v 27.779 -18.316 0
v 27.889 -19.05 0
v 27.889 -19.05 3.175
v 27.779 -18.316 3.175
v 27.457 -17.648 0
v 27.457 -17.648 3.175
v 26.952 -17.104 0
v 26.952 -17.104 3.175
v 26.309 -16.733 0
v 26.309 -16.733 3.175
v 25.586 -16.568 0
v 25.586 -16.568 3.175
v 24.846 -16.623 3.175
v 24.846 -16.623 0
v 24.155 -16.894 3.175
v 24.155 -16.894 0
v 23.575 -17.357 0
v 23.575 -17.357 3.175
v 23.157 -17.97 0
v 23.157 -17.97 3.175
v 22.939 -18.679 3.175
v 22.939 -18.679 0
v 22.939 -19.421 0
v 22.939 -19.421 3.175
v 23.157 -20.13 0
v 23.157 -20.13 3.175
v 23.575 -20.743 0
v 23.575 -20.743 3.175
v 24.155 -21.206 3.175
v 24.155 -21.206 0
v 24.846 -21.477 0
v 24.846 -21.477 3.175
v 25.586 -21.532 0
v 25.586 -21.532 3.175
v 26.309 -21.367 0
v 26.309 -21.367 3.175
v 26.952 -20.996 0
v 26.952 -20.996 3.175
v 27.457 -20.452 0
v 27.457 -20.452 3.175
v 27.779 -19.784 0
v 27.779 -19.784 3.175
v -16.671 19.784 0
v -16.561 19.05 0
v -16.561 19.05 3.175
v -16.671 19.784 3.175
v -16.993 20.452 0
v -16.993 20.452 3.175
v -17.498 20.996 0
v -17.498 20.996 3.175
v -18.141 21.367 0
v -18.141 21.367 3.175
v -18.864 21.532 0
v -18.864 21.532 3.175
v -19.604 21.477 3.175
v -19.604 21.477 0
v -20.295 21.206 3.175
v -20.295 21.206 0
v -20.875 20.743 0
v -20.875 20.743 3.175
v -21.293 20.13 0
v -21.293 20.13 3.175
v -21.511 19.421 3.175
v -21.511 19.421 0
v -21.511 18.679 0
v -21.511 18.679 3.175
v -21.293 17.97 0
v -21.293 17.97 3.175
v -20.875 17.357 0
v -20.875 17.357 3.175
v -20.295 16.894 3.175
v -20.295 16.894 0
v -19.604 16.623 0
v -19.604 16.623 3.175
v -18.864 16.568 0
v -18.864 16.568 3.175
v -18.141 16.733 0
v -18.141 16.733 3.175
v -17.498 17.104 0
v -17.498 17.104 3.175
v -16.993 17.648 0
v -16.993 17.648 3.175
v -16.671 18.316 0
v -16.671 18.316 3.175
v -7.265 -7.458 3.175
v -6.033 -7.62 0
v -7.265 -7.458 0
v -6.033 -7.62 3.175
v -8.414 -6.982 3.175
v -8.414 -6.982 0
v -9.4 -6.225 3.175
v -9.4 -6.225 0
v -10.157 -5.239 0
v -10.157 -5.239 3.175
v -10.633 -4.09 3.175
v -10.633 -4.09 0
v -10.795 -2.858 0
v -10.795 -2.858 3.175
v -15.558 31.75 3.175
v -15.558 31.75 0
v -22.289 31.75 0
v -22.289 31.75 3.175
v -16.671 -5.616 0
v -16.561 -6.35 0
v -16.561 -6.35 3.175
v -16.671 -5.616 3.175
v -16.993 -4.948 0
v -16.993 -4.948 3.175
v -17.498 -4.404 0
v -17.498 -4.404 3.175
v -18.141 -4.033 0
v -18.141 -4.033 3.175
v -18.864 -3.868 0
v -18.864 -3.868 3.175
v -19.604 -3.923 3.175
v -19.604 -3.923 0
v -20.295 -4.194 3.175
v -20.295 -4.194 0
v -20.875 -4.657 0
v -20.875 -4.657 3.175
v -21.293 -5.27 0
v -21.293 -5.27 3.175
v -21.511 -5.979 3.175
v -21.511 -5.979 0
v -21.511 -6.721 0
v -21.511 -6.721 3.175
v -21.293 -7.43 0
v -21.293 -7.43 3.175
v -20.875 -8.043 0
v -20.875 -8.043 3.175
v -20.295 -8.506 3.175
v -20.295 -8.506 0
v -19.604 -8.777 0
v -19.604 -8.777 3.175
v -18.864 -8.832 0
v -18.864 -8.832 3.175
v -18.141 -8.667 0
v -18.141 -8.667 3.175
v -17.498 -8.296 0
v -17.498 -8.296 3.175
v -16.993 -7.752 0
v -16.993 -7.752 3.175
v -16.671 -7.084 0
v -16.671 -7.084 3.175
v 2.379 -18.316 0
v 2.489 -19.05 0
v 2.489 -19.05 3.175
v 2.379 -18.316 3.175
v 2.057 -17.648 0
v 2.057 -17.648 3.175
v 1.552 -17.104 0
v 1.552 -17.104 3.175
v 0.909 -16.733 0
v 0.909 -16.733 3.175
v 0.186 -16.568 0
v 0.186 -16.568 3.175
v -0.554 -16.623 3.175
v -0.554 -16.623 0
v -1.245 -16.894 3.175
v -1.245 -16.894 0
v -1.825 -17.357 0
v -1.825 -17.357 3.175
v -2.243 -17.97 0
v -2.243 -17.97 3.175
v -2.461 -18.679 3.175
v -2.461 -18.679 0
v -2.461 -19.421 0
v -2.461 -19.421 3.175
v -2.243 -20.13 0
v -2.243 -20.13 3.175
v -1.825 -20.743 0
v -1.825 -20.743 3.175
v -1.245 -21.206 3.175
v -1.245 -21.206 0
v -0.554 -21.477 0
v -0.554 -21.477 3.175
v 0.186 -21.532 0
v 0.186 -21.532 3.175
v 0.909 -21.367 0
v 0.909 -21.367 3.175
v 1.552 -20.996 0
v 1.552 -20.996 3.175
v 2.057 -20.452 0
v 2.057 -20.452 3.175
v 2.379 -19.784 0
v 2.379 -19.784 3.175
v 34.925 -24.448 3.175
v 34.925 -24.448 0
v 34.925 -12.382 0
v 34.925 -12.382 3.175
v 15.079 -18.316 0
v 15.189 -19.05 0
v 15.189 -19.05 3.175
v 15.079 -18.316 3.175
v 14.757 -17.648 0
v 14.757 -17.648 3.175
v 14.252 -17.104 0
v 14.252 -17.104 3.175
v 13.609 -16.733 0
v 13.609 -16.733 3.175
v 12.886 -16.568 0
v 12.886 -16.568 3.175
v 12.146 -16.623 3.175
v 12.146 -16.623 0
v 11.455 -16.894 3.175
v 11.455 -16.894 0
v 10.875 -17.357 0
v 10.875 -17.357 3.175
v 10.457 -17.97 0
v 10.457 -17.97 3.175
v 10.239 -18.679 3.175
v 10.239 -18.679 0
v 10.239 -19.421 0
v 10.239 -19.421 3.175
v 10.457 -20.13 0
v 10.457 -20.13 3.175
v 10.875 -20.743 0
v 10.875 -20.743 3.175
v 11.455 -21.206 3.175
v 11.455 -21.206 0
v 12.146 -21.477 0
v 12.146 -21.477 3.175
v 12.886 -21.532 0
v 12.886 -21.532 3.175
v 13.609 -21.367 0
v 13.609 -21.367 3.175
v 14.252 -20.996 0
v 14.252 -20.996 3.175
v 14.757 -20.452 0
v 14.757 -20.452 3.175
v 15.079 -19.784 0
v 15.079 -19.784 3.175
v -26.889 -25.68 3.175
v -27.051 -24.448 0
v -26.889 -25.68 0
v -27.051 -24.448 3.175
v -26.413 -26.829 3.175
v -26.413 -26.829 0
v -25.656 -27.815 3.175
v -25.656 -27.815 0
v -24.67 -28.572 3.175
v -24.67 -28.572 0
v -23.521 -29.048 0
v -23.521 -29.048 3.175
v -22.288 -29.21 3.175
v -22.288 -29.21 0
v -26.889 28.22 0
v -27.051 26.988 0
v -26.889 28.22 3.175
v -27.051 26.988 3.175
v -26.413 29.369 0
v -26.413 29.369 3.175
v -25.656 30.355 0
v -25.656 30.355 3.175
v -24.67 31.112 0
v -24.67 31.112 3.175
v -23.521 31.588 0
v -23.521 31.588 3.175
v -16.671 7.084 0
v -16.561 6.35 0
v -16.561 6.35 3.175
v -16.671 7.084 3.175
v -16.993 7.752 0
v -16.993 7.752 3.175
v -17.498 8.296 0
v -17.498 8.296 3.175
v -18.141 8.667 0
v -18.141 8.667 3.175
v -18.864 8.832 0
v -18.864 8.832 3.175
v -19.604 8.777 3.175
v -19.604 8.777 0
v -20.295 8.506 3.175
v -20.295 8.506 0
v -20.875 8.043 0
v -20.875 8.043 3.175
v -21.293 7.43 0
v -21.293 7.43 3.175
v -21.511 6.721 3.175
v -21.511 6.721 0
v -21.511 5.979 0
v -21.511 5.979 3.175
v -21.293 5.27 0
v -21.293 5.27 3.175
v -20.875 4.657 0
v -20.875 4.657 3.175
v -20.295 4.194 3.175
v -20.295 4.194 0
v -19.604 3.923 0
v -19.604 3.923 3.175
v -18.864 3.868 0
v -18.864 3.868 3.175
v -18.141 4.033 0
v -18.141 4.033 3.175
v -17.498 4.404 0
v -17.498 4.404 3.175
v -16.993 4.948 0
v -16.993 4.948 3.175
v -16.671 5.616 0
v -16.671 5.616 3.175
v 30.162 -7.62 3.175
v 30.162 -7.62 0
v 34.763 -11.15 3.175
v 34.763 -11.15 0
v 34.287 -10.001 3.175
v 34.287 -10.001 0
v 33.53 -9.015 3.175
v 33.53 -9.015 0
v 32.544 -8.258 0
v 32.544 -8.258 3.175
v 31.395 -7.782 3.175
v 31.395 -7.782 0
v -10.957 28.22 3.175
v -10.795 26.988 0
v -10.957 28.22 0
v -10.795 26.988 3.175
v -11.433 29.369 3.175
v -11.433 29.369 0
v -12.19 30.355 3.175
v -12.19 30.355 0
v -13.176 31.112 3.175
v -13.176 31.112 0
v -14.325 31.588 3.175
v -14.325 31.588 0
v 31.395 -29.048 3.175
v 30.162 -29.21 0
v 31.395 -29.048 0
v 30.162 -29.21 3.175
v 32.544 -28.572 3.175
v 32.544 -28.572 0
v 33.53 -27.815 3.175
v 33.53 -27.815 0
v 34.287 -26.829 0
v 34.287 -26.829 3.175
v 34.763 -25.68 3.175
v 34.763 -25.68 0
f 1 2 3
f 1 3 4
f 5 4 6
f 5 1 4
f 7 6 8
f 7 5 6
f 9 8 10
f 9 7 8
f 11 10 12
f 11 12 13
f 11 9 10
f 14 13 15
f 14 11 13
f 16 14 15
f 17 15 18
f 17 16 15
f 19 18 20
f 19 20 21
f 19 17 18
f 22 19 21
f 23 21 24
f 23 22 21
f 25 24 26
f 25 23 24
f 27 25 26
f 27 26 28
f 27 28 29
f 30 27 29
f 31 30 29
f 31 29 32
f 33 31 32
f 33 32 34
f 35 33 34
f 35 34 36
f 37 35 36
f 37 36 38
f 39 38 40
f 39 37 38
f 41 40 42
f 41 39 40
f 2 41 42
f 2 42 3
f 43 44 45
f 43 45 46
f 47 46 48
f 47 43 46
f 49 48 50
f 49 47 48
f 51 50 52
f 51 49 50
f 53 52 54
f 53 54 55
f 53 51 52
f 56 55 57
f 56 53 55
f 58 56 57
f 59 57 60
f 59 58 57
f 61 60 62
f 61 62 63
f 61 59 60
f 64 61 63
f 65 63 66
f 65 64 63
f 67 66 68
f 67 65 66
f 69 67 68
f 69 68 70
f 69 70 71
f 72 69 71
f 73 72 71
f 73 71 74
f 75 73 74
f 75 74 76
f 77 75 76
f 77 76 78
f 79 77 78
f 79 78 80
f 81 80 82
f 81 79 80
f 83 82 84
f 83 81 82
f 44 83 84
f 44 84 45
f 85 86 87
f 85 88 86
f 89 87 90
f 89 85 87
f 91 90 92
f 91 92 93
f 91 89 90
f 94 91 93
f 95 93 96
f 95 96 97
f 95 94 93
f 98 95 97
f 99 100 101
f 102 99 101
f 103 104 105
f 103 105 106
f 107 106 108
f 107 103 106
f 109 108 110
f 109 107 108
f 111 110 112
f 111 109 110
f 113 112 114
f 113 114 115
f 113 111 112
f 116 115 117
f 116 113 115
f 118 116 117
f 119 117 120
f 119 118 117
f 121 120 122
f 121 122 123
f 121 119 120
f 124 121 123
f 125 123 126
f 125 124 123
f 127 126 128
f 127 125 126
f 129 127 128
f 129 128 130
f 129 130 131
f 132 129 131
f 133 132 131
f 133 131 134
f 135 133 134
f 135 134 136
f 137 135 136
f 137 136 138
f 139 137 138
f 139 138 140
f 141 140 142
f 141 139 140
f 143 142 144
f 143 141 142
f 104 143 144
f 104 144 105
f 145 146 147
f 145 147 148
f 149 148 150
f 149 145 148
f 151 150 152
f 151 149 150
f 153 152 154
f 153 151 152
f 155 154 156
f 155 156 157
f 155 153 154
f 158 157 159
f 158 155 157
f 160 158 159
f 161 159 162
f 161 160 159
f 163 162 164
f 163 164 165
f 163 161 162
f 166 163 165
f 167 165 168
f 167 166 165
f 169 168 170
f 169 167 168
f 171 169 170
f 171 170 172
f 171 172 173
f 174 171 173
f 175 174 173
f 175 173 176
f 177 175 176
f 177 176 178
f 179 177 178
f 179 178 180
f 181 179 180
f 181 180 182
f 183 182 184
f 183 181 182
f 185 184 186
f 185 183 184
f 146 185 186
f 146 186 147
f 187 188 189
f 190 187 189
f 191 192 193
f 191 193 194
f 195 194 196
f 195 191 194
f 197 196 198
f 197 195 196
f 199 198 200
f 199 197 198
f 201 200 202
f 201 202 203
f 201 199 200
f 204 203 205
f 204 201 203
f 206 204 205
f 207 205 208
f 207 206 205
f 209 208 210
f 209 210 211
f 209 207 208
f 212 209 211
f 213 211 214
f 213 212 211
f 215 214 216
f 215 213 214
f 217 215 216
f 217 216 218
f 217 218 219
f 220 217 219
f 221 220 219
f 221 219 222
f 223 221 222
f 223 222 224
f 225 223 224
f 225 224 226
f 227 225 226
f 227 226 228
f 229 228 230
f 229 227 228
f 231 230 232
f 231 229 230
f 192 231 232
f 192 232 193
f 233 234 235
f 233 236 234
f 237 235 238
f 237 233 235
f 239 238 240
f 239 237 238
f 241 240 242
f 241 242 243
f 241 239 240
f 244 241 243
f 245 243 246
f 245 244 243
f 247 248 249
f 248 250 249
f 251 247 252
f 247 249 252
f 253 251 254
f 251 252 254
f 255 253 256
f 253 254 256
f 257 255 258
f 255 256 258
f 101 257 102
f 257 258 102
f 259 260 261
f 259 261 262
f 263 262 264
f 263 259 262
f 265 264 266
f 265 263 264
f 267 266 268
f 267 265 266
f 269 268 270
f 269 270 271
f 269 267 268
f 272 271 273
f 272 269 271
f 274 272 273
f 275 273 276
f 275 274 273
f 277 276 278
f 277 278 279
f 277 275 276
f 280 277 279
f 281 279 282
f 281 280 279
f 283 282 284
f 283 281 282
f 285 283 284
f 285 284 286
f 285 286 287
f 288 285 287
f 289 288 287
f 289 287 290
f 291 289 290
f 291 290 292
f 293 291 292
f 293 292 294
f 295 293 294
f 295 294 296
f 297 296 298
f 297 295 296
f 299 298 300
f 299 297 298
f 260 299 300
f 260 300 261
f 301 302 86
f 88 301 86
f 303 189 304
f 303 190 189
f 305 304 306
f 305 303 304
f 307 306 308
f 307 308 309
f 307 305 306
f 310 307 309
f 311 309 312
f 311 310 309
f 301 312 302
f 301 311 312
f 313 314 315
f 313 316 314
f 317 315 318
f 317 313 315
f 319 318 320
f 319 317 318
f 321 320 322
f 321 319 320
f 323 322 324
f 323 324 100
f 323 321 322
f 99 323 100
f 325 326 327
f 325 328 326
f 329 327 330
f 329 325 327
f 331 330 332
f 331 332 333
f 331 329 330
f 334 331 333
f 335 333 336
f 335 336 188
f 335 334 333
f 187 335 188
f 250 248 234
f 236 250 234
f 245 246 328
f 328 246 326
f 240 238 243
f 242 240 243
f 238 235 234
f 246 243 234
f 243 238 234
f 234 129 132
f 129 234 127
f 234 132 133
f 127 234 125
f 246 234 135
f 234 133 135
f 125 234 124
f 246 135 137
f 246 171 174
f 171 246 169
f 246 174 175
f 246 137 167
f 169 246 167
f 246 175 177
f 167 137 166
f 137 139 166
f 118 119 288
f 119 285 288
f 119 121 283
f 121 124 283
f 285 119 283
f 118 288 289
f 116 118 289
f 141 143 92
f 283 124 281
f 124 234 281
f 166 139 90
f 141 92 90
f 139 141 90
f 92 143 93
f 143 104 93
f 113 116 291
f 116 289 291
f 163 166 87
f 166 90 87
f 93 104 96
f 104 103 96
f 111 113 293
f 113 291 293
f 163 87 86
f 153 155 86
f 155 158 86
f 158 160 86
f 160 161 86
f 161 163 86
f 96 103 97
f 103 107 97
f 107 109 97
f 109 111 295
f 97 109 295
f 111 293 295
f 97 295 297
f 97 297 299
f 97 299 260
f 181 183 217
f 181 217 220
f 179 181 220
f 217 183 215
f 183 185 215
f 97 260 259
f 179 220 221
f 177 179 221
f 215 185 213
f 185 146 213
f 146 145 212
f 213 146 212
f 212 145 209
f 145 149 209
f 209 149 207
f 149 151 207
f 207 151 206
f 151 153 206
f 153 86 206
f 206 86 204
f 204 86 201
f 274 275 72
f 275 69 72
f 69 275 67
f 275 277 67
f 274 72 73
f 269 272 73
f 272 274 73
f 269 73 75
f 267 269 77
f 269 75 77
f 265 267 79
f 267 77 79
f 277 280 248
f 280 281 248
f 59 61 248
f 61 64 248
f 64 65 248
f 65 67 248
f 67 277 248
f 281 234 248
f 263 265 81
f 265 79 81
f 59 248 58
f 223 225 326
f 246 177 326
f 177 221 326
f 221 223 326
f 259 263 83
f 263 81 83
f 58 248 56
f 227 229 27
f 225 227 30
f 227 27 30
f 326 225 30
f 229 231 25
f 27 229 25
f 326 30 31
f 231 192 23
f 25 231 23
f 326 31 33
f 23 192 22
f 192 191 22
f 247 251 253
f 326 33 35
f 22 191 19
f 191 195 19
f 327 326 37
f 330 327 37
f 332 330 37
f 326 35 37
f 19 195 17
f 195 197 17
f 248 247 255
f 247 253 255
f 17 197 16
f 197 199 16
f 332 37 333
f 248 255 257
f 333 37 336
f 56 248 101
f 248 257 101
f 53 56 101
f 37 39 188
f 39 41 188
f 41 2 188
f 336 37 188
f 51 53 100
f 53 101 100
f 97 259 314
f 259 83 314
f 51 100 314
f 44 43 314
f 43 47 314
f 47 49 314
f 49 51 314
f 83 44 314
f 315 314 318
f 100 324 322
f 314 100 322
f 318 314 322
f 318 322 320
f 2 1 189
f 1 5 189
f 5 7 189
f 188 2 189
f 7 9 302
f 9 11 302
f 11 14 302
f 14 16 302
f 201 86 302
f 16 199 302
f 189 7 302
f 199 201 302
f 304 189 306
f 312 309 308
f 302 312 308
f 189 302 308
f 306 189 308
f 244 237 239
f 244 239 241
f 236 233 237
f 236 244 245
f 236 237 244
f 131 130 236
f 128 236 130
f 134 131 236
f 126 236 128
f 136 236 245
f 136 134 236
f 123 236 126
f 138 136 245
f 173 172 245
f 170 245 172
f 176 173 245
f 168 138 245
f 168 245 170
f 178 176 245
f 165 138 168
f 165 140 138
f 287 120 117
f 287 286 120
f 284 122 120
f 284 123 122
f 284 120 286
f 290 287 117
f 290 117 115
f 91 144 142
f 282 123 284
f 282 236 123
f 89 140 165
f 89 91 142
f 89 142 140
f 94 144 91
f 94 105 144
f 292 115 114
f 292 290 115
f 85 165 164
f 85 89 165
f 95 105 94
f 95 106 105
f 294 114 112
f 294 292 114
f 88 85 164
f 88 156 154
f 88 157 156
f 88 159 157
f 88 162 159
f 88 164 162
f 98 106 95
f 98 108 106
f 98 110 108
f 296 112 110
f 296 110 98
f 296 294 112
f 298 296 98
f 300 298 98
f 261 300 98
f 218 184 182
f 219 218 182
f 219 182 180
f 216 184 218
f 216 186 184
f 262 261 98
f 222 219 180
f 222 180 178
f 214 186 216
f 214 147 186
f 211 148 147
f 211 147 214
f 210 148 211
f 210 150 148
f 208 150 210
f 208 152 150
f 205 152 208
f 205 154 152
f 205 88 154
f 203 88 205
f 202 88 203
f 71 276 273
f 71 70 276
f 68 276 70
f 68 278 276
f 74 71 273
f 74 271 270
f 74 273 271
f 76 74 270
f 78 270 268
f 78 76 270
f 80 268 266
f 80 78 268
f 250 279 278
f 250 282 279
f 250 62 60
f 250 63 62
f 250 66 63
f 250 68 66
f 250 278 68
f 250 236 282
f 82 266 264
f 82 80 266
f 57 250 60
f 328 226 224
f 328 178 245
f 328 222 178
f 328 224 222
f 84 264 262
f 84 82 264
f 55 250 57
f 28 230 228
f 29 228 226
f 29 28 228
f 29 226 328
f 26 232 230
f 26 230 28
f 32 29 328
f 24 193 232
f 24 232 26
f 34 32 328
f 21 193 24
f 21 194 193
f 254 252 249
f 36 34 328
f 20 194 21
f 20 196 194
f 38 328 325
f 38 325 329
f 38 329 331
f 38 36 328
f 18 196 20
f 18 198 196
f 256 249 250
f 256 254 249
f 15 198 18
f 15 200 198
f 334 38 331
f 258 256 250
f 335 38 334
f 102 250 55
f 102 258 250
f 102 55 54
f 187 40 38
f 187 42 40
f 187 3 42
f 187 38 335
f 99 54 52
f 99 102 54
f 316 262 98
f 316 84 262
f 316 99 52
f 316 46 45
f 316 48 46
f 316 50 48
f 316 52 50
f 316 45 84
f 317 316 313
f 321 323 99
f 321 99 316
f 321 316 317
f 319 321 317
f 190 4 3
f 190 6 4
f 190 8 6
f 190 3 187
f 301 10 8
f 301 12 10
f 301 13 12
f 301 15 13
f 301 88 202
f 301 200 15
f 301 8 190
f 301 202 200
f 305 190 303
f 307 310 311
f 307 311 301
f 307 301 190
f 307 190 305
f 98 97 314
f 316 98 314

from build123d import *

# Parameters (mm, degrees)
SKETCH1_R           = 2.4892
BOSS_EXTRUDE1_DEPTH = 3.175
FILLET1_R           = 4.7625


with BuildPart() as part:
    # Sketch1 → Boss-Extrude1 (new body)
    with BuildSketch(Plane.XY):
        Polygon((-27.051, 31.75), (-27.051, -29.21), (34.925, -29.21), (34.925, -7.62), (-10.795, -7.62), (-10.795, 31.75), align=None)
        with Locations((-19.05, -19.05)):
            Circle(SKETCH1_R, mode=Mode.SUBTRACT)
        with Locations((-19.05, -6.35)):
            Circle(SKETCH1_R, mode=Mode.SUBTRACT)
        with Locations((0, -19.05)):
            Circle(SKETCH1_R, mode=Mode.SUBTRACT)
        with Locations((12.7, -19.05)):
            Circle(SKETCH1_R, mode=Mode.SUBTRACT)
        with Locations((25.4, -19.05)):
            Circle(SKETCH1_R, mode=Mode.SUBTRACT)
        with Locations((-19.05, 6.35)):
            Circle(SKETCH1_R, mode=Mode.SUBTRACT)
        with Locations((-19.05, 19.05)):
            Circle(SKETCH1_R, mode=Mode.SUBTRACT)
        with Locations((-19.05, -19.05)):
            Circle(SKETCH1_R)
    extrude(amount=BOSS_EXTRUDE1_DEPTH)

    # Fillet1
    fillet1_edges = [part.edges().sort_by_distance(p)[0] for p in [
        (-27.051, 31.75, 1.5875),
        (-10.795, 31.75, 1.5875),
        (-10.795, -7.62, 1.5875),
        (34.925, -7.62, 1.5875),
        (34.925, -29.21, 1.5875),
        (-27.051, -29.21, 1.5875),
    ]]
    fillet(fillet1_edges, radius=FILLET1_R)


solid = part.part
